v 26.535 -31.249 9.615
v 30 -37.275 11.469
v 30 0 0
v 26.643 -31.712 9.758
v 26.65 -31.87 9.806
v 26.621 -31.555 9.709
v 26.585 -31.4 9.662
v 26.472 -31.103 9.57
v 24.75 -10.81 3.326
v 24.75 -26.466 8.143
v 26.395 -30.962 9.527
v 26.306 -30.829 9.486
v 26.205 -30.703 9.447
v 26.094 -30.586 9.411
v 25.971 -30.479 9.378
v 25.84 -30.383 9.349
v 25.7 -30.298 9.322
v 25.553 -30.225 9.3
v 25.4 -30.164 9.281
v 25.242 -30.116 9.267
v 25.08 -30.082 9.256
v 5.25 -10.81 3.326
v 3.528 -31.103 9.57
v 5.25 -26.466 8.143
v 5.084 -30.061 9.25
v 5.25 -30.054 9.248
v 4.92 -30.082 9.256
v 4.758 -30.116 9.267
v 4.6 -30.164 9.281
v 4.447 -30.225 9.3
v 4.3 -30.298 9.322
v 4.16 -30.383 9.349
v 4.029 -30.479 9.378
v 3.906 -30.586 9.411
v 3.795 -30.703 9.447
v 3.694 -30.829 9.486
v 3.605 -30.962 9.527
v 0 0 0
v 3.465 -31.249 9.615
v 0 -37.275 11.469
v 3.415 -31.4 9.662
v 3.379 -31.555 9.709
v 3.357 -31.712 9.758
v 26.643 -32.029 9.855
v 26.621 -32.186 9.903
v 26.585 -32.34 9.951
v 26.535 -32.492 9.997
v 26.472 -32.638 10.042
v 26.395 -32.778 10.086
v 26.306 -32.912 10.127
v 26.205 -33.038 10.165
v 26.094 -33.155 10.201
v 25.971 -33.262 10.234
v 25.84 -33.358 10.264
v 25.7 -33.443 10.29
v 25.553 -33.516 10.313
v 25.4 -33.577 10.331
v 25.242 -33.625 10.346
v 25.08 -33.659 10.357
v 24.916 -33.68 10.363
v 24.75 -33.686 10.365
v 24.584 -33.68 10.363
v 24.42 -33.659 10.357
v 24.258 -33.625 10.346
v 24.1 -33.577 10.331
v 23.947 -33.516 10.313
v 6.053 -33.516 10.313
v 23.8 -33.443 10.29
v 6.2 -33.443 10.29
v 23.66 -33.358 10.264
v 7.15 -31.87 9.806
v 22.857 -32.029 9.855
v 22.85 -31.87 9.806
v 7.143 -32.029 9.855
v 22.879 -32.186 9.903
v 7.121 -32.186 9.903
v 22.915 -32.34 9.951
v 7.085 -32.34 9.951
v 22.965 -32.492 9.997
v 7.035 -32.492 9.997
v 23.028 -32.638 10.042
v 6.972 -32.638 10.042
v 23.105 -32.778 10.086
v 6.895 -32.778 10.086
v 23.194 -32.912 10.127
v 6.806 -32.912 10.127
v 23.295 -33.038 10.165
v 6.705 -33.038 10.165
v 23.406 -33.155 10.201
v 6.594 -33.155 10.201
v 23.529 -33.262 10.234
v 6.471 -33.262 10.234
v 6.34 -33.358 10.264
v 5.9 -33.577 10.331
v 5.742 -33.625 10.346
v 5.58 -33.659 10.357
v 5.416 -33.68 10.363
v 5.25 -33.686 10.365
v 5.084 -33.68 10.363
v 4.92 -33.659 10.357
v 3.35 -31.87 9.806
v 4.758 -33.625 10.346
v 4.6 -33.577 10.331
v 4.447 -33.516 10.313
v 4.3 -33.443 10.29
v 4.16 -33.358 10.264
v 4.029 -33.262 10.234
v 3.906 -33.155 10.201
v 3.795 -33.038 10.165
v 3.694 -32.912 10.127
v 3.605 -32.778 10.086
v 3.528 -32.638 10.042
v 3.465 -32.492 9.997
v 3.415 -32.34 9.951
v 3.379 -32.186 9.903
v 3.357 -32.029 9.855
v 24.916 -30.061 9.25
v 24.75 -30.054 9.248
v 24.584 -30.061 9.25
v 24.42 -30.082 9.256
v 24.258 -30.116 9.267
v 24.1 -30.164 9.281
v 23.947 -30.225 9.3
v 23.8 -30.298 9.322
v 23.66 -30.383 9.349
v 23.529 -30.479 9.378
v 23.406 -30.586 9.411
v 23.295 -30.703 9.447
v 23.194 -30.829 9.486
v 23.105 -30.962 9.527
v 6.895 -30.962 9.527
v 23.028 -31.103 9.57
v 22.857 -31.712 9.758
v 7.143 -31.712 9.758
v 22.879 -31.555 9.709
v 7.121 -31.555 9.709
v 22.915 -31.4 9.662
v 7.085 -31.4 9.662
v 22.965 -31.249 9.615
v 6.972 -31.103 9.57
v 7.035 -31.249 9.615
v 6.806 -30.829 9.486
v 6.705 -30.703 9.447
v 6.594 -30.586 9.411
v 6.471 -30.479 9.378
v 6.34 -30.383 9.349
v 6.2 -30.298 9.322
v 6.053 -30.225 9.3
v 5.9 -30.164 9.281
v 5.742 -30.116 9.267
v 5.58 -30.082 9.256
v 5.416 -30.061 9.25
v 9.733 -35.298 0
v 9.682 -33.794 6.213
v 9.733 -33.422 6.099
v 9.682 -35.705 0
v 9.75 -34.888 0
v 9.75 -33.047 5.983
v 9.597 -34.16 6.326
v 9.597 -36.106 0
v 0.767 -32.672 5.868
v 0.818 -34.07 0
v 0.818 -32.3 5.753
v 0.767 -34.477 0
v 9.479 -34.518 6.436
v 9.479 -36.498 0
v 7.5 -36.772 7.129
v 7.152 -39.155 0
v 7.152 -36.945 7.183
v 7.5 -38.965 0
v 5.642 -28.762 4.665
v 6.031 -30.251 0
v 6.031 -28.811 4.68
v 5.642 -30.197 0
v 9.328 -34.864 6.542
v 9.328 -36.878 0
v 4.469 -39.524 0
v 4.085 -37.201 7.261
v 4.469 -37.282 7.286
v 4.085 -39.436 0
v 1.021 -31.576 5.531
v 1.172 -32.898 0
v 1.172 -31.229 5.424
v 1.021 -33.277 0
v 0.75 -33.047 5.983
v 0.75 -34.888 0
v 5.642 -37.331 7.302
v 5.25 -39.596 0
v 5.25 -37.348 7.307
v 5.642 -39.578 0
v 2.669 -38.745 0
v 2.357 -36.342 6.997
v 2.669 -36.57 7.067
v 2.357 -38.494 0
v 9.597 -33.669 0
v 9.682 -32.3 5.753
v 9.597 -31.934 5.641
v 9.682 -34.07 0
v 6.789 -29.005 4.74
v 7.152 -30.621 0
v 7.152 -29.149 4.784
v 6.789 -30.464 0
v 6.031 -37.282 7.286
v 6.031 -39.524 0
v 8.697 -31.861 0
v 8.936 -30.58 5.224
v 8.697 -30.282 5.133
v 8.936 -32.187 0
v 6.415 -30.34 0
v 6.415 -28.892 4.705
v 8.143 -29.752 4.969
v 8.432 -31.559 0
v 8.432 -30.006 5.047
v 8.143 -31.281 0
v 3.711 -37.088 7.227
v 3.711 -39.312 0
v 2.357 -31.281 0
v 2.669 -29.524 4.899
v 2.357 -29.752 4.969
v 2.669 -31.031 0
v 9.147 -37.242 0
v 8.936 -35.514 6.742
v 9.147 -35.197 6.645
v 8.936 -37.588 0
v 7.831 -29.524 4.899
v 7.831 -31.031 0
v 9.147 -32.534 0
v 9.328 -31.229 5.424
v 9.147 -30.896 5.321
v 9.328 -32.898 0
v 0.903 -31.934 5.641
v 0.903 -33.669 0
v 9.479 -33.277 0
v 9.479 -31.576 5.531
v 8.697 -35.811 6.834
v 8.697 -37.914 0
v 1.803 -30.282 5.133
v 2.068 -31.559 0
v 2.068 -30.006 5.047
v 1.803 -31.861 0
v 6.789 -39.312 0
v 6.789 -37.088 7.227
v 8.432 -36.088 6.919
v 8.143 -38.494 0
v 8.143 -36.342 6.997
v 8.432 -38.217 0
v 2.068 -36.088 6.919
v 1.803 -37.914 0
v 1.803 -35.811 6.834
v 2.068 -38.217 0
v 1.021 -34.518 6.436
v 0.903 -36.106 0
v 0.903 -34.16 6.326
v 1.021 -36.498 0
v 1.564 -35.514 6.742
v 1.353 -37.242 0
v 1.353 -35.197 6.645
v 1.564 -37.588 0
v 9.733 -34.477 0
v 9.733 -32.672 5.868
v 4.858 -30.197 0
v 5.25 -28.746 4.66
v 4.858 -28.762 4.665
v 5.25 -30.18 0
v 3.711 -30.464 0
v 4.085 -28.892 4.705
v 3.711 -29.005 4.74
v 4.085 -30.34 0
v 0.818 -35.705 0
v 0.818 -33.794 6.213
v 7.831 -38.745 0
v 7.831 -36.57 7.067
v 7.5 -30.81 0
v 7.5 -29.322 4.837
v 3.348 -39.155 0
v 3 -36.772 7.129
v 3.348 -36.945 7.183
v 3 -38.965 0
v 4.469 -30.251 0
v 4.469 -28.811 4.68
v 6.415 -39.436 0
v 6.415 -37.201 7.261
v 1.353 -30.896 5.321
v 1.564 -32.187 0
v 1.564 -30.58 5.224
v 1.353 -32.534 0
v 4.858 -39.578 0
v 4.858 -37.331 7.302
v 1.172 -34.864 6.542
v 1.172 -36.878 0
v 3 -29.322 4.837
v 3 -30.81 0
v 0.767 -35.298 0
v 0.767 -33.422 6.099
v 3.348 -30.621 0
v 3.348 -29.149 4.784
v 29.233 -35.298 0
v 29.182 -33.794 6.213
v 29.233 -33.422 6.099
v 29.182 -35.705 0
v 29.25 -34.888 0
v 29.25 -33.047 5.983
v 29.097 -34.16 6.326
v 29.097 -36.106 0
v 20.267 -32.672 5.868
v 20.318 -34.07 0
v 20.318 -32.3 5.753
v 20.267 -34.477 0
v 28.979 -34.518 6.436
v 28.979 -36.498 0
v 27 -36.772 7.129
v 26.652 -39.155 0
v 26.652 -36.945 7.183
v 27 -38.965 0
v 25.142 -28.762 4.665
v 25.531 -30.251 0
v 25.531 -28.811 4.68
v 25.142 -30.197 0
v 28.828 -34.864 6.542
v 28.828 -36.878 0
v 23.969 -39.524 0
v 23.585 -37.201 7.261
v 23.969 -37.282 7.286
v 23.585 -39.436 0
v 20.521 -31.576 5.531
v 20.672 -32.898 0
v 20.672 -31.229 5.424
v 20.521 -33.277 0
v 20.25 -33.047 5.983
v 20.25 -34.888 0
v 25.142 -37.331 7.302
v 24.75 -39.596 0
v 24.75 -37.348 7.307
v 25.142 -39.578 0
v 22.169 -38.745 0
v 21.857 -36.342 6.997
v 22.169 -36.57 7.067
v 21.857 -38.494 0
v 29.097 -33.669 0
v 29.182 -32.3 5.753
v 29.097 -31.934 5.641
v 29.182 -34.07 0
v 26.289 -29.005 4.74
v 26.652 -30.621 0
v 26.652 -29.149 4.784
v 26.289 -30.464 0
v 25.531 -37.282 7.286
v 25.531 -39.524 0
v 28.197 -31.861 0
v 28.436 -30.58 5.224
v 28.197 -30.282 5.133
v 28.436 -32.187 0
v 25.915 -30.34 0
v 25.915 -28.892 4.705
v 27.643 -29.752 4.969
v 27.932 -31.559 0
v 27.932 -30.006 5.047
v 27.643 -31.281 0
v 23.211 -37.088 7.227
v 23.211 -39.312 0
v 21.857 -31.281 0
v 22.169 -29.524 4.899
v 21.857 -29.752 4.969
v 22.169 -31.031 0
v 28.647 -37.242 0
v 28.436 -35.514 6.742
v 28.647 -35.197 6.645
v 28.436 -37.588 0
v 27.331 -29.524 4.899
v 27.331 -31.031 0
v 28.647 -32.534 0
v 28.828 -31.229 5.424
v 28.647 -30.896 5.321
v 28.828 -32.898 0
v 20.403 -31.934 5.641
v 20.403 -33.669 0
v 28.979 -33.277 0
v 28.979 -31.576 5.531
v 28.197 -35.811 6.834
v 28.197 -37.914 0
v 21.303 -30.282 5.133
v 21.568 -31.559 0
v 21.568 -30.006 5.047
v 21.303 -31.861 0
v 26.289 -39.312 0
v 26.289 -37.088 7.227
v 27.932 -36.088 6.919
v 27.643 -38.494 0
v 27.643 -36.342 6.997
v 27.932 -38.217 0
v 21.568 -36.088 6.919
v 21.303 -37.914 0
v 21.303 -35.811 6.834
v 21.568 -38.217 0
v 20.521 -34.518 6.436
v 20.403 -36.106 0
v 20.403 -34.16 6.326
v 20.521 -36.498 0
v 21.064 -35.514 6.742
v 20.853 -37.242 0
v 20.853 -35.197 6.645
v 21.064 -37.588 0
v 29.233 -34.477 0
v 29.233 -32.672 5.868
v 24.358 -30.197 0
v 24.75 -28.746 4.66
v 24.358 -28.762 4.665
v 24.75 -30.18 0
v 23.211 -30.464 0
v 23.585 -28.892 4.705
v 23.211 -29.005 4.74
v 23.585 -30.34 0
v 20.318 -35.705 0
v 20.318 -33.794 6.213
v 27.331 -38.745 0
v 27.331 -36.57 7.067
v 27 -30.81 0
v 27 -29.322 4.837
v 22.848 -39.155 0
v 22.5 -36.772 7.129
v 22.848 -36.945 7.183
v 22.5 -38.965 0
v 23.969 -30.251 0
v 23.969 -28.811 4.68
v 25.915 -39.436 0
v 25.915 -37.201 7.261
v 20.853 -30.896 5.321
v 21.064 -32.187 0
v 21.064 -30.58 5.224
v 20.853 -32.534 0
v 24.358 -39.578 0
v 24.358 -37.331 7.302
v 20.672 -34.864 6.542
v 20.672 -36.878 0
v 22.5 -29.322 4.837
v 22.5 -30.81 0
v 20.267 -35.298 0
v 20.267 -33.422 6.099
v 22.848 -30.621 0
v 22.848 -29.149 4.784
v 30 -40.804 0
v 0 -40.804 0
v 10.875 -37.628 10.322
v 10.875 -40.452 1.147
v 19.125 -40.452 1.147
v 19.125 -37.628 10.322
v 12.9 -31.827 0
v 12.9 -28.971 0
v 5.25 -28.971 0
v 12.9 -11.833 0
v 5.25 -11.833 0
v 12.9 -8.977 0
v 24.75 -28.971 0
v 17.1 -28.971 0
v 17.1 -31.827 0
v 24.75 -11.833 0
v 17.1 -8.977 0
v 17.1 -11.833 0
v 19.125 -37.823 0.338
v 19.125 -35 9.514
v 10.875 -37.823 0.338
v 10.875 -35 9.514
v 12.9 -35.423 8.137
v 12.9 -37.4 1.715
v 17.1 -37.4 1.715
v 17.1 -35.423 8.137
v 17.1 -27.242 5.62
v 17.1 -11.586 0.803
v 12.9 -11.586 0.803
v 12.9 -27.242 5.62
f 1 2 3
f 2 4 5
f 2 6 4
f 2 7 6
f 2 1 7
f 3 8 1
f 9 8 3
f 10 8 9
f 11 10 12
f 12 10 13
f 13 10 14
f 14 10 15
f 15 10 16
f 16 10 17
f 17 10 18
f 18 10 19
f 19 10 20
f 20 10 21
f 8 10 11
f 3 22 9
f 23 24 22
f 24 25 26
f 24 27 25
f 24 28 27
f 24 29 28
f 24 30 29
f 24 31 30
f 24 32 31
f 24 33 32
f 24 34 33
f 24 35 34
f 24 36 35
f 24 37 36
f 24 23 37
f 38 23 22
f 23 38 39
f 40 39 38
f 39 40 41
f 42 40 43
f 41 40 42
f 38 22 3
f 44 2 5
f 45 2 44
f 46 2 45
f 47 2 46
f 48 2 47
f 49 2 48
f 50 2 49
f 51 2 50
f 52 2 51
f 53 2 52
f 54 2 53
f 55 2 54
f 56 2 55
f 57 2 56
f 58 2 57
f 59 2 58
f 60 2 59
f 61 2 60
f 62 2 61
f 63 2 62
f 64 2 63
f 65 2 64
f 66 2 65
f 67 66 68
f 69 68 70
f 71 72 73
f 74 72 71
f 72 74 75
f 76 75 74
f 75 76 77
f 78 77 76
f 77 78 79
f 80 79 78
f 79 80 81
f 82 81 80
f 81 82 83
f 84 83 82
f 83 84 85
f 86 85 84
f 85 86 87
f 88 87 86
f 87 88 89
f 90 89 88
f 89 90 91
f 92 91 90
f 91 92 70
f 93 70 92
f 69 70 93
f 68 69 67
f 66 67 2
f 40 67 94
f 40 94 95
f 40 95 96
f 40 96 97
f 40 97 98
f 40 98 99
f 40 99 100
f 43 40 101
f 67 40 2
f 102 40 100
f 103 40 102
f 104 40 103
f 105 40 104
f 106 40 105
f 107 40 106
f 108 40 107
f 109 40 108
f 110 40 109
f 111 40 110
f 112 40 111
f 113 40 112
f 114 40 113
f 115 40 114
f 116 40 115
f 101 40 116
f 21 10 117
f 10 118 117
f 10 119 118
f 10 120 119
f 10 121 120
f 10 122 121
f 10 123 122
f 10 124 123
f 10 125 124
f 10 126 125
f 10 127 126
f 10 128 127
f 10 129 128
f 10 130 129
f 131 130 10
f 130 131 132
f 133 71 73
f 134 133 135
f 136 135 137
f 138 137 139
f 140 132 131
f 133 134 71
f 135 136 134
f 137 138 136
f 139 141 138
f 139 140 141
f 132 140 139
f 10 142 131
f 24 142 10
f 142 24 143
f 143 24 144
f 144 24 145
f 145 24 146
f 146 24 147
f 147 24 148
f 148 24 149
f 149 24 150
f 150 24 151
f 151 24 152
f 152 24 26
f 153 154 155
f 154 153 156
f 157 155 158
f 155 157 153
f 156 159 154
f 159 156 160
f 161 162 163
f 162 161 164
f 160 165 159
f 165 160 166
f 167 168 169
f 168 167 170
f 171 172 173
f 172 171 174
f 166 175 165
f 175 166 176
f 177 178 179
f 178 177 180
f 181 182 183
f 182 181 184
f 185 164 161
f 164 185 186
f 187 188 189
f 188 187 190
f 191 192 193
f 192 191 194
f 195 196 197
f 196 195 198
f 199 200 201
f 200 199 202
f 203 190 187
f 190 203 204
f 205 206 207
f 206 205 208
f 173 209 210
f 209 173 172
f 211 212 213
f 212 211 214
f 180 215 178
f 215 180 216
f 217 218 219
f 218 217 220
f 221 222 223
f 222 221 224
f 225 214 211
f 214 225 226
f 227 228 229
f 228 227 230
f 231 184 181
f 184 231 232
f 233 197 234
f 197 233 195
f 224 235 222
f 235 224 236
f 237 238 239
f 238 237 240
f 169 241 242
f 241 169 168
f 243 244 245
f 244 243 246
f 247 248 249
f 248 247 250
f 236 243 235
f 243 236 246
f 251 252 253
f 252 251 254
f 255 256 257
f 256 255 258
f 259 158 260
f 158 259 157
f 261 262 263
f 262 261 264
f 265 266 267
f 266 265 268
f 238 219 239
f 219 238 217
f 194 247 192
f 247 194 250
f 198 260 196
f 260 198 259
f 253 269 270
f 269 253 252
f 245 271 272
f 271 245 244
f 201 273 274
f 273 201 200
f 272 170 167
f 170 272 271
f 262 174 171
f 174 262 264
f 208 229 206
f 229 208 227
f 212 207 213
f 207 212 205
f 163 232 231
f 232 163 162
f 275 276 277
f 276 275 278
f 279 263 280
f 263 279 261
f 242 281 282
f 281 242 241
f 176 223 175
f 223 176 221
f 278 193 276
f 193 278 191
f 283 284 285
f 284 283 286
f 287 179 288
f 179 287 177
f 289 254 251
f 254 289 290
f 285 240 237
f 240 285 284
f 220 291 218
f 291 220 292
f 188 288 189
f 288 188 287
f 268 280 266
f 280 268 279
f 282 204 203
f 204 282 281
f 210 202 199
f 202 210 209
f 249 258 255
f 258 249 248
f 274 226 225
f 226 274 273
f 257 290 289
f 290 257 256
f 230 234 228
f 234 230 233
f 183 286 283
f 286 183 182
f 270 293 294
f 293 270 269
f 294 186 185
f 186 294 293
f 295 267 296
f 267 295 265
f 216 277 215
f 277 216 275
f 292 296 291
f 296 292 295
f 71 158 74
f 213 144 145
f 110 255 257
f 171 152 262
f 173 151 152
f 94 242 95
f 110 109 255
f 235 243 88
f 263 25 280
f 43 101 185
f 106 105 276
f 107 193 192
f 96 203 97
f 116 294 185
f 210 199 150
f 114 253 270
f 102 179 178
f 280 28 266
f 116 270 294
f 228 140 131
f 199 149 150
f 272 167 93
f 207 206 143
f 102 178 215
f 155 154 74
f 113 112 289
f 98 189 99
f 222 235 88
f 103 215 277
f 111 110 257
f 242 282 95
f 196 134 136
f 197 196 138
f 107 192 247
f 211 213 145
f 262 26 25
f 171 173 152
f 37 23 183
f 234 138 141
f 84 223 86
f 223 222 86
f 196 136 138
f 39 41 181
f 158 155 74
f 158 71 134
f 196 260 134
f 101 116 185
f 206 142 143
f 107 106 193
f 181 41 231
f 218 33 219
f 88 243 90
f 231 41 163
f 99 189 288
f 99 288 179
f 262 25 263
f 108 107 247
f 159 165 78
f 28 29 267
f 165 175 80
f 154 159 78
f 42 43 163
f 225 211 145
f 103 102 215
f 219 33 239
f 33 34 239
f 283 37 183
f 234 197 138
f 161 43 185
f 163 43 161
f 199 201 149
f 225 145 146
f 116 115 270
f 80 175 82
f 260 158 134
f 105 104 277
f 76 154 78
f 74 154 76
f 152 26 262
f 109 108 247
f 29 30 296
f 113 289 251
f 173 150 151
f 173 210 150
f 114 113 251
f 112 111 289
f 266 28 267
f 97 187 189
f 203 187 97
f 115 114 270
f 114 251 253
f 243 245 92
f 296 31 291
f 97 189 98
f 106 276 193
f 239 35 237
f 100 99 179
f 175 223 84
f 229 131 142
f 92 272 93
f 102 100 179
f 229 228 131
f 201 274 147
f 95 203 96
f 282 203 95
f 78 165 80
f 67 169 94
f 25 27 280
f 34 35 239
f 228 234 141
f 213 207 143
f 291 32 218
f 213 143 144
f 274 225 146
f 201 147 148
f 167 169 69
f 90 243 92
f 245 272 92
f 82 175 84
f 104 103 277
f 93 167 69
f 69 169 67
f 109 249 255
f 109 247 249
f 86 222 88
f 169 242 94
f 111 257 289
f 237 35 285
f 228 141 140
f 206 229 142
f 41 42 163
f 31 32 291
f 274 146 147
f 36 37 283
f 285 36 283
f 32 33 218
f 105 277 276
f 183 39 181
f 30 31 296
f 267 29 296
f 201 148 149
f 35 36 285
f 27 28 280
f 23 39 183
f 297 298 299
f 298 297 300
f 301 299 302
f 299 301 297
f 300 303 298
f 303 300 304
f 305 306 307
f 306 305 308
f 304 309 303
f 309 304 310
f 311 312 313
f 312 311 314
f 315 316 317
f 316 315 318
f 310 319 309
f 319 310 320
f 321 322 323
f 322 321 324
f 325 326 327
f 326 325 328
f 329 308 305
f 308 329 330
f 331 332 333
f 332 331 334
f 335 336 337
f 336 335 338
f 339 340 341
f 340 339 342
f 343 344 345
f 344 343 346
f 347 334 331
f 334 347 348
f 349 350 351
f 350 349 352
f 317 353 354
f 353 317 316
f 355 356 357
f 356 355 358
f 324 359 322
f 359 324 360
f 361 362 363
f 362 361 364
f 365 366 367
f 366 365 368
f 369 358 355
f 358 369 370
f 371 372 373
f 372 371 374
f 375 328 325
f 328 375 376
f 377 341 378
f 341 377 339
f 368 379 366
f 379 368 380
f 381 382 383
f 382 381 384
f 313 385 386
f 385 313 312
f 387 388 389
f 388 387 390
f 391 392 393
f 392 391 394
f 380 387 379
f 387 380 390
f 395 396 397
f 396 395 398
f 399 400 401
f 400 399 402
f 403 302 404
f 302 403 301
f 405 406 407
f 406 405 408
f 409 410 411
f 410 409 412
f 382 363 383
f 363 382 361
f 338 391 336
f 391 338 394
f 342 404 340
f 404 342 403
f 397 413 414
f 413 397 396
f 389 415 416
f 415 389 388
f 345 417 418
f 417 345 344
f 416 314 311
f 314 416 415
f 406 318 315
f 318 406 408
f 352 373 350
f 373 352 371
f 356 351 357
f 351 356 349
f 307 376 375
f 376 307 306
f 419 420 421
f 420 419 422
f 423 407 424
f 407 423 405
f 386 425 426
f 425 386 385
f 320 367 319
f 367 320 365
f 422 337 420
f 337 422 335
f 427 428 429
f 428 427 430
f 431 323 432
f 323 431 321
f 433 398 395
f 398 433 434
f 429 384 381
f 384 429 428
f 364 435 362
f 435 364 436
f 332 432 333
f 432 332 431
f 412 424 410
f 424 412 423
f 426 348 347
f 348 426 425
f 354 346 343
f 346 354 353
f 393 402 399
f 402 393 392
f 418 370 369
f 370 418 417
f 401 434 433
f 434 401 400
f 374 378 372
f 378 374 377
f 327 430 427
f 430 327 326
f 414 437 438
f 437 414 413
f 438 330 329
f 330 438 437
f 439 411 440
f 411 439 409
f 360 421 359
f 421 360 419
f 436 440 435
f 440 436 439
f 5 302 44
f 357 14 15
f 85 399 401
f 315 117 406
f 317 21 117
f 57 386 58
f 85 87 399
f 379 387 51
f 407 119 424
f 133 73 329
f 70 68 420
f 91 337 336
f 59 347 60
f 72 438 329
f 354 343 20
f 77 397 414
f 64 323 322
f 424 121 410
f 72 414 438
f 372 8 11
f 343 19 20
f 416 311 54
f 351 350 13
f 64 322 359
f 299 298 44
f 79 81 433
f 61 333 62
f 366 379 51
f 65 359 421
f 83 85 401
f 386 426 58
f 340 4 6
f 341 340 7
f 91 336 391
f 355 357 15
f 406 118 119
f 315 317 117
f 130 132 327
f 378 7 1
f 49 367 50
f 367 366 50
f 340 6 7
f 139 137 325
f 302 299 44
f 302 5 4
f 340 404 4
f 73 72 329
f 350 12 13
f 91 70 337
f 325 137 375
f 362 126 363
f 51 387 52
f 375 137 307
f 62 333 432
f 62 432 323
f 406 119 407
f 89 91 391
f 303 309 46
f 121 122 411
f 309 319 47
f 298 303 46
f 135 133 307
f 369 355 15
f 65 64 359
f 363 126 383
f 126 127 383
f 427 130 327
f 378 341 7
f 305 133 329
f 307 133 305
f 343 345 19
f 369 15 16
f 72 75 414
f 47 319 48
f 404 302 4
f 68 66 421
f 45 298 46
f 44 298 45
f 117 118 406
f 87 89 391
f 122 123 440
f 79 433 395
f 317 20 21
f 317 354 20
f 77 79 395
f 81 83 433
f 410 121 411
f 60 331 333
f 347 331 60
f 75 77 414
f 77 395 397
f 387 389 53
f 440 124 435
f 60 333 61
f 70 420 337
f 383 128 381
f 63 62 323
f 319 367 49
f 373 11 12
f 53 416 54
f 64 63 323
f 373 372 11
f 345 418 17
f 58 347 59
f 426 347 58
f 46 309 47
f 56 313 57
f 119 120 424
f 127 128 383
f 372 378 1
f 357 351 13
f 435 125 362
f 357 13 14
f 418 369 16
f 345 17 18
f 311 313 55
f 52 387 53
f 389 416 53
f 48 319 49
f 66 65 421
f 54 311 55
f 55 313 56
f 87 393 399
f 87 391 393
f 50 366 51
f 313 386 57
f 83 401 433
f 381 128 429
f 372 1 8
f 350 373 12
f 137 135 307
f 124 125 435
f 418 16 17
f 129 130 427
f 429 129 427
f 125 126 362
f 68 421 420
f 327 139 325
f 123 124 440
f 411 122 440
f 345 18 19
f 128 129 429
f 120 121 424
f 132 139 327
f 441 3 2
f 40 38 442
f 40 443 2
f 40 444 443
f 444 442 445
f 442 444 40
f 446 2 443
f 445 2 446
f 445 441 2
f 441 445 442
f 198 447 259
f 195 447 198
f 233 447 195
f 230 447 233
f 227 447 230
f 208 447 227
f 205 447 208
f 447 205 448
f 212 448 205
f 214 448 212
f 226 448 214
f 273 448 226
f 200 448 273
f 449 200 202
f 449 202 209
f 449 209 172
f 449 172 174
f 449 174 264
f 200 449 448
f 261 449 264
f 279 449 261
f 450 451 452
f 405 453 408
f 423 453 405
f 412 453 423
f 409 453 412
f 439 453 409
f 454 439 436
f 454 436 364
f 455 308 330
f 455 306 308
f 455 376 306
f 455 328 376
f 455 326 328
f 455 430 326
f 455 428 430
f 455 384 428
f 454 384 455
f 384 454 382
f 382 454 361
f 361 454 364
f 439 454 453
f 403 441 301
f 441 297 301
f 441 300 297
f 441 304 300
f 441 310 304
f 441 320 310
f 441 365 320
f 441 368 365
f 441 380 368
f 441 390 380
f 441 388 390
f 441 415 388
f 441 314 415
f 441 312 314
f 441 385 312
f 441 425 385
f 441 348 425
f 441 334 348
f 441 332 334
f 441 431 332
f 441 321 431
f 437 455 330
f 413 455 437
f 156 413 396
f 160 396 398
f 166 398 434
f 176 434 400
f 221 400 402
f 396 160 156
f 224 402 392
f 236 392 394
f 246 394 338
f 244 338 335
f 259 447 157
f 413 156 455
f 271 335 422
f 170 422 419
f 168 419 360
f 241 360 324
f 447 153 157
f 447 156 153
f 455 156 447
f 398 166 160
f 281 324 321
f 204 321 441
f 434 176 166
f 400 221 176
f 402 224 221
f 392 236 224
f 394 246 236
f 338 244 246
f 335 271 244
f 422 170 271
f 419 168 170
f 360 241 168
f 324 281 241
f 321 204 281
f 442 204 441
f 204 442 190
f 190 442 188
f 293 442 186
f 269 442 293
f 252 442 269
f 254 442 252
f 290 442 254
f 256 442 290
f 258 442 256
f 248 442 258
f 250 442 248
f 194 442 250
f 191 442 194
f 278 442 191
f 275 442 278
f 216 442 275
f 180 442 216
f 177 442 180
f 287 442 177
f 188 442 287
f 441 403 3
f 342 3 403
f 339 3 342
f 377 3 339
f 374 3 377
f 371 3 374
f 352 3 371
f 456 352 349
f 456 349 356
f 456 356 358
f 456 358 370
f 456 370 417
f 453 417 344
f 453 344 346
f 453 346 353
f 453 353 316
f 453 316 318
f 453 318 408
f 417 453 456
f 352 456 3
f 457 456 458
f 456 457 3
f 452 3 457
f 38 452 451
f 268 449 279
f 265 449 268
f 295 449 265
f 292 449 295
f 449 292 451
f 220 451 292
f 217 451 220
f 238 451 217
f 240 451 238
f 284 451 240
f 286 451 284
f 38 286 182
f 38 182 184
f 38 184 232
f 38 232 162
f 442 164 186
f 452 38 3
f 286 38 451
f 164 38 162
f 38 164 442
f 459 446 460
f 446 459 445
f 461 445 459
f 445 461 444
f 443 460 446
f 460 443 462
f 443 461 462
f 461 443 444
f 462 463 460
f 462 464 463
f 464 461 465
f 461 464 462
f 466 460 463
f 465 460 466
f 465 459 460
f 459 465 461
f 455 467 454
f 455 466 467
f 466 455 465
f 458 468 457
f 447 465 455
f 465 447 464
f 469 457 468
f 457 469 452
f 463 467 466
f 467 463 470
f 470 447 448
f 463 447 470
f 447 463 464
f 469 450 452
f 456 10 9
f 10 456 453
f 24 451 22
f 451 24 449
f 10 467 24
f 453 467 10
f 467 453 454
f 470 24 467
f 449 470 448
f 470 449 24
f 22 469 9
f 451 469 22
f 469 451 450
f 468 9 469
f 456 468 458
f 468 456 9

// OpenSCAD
// Width of cross-section
width = 30;
// Length - bolt will need to be this long. 52=2" 39=1.5 26=1"
length = 39;
// Minimum height - by tightening bolt, can increase up to about 125% of this value
min_height = 12;
// Attachment screw holes (to secure wedge to work)
attachment_holes = 2; // [0,2,4]
// Attachment screw head type (mushroom=pan head)
attachment_head_type = "bugle"; // [bugle,mushroom]

/* [Advanced] */
// Slot width (should fit flat to flat dimension of hex nut) - 8.2mm for #6 (US), 7.4mm for M4
slot_width = 8.25;
// Slot depth - must accommodate greater of bolt head height and nut height. May need to be greater for steeper gradient
slot_depth = 2.75;
// Ratio of slot height to minimum height
slot_height_ratio = 0.8;
// Bolt width
bolt_width = 4.2;
// Bolt slot height as ratio of slot height
bolt_slot_height_ratio = 0.7;
// Ratio of center hole width to overall
center_hole_ratio_w = 0.65;
// Ratio of center hole length to overall
center_hole_ratio_l = 0.42;
// Number on build plate
number_on_plate = 1; // [1,2]
// Arrangement of multiple pieces on build plate
multiple_arrangement = "sidebyside"; // [sidebyside,endtoend]
// Attachment hole screw shaft width; 3.8 for #8, 4.8 for #10
attachment_shaft_width = 3.8;
// Attachment hole taper height for bugle head
attachment_taper_height = 4;
// Attachment hole taper top diameter; #8 woodcraft screws use 8.2, common wood screws closer to 9.0, #10 9.8
attachment_taper_top_diameter = 9.0;

/* [Hidden] */
hypotenuse = sqrt(length*length + min_height*min_height);

adjustable_shim();

if (number_on_plate > 1)
{
  if (multiple_arrangement == "sidebyside")
  {
	translate([-2,-hypotenuse,0]) rotate([0,0,180]) adjustable_shim();
  }
  if (multiple_arrangement == "endtoend")
  {
	translate([width,-2.05*hypotenuse,0]) rotate([0,0,180]) adjustable_shim();
  }
}

// Produce a single shim, printing with hypotenuse down
module adjustable_shim()
{
  assign( angle = atan(min_height/length), slot_height = min_height * slot_height_ratio ) render( convexity = 5 )
  {
    rotate([180-angle,0,0])
    difference()
    {
	  // Basic rectangle
	  cube(size=[width,length,min_height], center=false);
	  // Subtract half to make wedge
     rotate([angle,0,0]) cube(size=[width,hypotenuse,min_height], center=false);
	  // Subtract larger slot from end
	  translate([(width-slot_width)/2,length-slot_depth,min_height*(1.0-slot_height_ratio)/2]) cube(size=[slot_width, slot_depth, slot_height], center=false);
	  // Subtract bolt (via) slot
	  translate([(width-bolt_width)/2,0,(min_height-bolt_slot_height_ratio * slot_height)/2]) cube(size=[bolt_width, length, bolt_slot_height_ratio * slot_height], center=false);
	  // Create center hole so we can secure fasteners through this
	  translate([(1-center_hole_ratio_w)*width/2,(1-center_hole_ratio_l)*length/2,0]) cube(size=[width*center_hole_ratio_w, length*center_hole_ratio_l, min_height], center=false);
	  // Optional attachment screw holes
	  attachment_screws();
    }
  }
}

// Generate 2 or 4 attachment screw holes
module attachment_screws()
{
  if (attachment_holes >= 2) assign( margin_side = width * (1.0 - center_hole_ratio_w), margin_end = length * (1.0 - center_hole_ratio_l) )
  {
	 translate( [margin_side / 2, length - margin_end / 4, 0 ] ) attachment_hole();
	 translate( [width - margin_side / 2, length - margin_end / 4, 0 ] ) attachment_hole();
	 if (attachment_holes >= 4)
    {
	 	// At the thin end, mushroom heads will be on a slant
		 translate( [margin_side / 2, margin_end / 2, 0] ) attachment_hole();
		 translate( [width - margin_side / 2, margin_end / 2, 0] ) attachment_hole();
    }
  }
}

// Generate a single untranslated attachment hole
module attachment_hole()
{
  if (attachment_head_type == "bugle")
  {
	attachment_hole_bugle();
  }
  if (attachment_head_type == "mushroom")
  {
	attachment_hole_mushroom();
  }
}

// Taper head (bugle) attachment hole
module attachment_hole_bugle()
{
  union()
  {
   attachment_hole_mushroom();
	cylinder( r1 = attachment_shaft_width / 2, r2 = attachment_taper_top_diameter / 2, h = attachment_taper_height, $fn = 72 );
  }
}

// Pan head (mushroom) attachment hole
module attachment_hole_mushroom()
{
  union()
  {
    cylinder( h = min_height, r = attachment_shaft_width / 2, center = false, $fn = 72 );
    translate([0,0,attachment_taper_height]) cylinder(h = min_height, r = attachment_taper_top_diameter / 2, center = false, $fn = 72 );
  }
}
